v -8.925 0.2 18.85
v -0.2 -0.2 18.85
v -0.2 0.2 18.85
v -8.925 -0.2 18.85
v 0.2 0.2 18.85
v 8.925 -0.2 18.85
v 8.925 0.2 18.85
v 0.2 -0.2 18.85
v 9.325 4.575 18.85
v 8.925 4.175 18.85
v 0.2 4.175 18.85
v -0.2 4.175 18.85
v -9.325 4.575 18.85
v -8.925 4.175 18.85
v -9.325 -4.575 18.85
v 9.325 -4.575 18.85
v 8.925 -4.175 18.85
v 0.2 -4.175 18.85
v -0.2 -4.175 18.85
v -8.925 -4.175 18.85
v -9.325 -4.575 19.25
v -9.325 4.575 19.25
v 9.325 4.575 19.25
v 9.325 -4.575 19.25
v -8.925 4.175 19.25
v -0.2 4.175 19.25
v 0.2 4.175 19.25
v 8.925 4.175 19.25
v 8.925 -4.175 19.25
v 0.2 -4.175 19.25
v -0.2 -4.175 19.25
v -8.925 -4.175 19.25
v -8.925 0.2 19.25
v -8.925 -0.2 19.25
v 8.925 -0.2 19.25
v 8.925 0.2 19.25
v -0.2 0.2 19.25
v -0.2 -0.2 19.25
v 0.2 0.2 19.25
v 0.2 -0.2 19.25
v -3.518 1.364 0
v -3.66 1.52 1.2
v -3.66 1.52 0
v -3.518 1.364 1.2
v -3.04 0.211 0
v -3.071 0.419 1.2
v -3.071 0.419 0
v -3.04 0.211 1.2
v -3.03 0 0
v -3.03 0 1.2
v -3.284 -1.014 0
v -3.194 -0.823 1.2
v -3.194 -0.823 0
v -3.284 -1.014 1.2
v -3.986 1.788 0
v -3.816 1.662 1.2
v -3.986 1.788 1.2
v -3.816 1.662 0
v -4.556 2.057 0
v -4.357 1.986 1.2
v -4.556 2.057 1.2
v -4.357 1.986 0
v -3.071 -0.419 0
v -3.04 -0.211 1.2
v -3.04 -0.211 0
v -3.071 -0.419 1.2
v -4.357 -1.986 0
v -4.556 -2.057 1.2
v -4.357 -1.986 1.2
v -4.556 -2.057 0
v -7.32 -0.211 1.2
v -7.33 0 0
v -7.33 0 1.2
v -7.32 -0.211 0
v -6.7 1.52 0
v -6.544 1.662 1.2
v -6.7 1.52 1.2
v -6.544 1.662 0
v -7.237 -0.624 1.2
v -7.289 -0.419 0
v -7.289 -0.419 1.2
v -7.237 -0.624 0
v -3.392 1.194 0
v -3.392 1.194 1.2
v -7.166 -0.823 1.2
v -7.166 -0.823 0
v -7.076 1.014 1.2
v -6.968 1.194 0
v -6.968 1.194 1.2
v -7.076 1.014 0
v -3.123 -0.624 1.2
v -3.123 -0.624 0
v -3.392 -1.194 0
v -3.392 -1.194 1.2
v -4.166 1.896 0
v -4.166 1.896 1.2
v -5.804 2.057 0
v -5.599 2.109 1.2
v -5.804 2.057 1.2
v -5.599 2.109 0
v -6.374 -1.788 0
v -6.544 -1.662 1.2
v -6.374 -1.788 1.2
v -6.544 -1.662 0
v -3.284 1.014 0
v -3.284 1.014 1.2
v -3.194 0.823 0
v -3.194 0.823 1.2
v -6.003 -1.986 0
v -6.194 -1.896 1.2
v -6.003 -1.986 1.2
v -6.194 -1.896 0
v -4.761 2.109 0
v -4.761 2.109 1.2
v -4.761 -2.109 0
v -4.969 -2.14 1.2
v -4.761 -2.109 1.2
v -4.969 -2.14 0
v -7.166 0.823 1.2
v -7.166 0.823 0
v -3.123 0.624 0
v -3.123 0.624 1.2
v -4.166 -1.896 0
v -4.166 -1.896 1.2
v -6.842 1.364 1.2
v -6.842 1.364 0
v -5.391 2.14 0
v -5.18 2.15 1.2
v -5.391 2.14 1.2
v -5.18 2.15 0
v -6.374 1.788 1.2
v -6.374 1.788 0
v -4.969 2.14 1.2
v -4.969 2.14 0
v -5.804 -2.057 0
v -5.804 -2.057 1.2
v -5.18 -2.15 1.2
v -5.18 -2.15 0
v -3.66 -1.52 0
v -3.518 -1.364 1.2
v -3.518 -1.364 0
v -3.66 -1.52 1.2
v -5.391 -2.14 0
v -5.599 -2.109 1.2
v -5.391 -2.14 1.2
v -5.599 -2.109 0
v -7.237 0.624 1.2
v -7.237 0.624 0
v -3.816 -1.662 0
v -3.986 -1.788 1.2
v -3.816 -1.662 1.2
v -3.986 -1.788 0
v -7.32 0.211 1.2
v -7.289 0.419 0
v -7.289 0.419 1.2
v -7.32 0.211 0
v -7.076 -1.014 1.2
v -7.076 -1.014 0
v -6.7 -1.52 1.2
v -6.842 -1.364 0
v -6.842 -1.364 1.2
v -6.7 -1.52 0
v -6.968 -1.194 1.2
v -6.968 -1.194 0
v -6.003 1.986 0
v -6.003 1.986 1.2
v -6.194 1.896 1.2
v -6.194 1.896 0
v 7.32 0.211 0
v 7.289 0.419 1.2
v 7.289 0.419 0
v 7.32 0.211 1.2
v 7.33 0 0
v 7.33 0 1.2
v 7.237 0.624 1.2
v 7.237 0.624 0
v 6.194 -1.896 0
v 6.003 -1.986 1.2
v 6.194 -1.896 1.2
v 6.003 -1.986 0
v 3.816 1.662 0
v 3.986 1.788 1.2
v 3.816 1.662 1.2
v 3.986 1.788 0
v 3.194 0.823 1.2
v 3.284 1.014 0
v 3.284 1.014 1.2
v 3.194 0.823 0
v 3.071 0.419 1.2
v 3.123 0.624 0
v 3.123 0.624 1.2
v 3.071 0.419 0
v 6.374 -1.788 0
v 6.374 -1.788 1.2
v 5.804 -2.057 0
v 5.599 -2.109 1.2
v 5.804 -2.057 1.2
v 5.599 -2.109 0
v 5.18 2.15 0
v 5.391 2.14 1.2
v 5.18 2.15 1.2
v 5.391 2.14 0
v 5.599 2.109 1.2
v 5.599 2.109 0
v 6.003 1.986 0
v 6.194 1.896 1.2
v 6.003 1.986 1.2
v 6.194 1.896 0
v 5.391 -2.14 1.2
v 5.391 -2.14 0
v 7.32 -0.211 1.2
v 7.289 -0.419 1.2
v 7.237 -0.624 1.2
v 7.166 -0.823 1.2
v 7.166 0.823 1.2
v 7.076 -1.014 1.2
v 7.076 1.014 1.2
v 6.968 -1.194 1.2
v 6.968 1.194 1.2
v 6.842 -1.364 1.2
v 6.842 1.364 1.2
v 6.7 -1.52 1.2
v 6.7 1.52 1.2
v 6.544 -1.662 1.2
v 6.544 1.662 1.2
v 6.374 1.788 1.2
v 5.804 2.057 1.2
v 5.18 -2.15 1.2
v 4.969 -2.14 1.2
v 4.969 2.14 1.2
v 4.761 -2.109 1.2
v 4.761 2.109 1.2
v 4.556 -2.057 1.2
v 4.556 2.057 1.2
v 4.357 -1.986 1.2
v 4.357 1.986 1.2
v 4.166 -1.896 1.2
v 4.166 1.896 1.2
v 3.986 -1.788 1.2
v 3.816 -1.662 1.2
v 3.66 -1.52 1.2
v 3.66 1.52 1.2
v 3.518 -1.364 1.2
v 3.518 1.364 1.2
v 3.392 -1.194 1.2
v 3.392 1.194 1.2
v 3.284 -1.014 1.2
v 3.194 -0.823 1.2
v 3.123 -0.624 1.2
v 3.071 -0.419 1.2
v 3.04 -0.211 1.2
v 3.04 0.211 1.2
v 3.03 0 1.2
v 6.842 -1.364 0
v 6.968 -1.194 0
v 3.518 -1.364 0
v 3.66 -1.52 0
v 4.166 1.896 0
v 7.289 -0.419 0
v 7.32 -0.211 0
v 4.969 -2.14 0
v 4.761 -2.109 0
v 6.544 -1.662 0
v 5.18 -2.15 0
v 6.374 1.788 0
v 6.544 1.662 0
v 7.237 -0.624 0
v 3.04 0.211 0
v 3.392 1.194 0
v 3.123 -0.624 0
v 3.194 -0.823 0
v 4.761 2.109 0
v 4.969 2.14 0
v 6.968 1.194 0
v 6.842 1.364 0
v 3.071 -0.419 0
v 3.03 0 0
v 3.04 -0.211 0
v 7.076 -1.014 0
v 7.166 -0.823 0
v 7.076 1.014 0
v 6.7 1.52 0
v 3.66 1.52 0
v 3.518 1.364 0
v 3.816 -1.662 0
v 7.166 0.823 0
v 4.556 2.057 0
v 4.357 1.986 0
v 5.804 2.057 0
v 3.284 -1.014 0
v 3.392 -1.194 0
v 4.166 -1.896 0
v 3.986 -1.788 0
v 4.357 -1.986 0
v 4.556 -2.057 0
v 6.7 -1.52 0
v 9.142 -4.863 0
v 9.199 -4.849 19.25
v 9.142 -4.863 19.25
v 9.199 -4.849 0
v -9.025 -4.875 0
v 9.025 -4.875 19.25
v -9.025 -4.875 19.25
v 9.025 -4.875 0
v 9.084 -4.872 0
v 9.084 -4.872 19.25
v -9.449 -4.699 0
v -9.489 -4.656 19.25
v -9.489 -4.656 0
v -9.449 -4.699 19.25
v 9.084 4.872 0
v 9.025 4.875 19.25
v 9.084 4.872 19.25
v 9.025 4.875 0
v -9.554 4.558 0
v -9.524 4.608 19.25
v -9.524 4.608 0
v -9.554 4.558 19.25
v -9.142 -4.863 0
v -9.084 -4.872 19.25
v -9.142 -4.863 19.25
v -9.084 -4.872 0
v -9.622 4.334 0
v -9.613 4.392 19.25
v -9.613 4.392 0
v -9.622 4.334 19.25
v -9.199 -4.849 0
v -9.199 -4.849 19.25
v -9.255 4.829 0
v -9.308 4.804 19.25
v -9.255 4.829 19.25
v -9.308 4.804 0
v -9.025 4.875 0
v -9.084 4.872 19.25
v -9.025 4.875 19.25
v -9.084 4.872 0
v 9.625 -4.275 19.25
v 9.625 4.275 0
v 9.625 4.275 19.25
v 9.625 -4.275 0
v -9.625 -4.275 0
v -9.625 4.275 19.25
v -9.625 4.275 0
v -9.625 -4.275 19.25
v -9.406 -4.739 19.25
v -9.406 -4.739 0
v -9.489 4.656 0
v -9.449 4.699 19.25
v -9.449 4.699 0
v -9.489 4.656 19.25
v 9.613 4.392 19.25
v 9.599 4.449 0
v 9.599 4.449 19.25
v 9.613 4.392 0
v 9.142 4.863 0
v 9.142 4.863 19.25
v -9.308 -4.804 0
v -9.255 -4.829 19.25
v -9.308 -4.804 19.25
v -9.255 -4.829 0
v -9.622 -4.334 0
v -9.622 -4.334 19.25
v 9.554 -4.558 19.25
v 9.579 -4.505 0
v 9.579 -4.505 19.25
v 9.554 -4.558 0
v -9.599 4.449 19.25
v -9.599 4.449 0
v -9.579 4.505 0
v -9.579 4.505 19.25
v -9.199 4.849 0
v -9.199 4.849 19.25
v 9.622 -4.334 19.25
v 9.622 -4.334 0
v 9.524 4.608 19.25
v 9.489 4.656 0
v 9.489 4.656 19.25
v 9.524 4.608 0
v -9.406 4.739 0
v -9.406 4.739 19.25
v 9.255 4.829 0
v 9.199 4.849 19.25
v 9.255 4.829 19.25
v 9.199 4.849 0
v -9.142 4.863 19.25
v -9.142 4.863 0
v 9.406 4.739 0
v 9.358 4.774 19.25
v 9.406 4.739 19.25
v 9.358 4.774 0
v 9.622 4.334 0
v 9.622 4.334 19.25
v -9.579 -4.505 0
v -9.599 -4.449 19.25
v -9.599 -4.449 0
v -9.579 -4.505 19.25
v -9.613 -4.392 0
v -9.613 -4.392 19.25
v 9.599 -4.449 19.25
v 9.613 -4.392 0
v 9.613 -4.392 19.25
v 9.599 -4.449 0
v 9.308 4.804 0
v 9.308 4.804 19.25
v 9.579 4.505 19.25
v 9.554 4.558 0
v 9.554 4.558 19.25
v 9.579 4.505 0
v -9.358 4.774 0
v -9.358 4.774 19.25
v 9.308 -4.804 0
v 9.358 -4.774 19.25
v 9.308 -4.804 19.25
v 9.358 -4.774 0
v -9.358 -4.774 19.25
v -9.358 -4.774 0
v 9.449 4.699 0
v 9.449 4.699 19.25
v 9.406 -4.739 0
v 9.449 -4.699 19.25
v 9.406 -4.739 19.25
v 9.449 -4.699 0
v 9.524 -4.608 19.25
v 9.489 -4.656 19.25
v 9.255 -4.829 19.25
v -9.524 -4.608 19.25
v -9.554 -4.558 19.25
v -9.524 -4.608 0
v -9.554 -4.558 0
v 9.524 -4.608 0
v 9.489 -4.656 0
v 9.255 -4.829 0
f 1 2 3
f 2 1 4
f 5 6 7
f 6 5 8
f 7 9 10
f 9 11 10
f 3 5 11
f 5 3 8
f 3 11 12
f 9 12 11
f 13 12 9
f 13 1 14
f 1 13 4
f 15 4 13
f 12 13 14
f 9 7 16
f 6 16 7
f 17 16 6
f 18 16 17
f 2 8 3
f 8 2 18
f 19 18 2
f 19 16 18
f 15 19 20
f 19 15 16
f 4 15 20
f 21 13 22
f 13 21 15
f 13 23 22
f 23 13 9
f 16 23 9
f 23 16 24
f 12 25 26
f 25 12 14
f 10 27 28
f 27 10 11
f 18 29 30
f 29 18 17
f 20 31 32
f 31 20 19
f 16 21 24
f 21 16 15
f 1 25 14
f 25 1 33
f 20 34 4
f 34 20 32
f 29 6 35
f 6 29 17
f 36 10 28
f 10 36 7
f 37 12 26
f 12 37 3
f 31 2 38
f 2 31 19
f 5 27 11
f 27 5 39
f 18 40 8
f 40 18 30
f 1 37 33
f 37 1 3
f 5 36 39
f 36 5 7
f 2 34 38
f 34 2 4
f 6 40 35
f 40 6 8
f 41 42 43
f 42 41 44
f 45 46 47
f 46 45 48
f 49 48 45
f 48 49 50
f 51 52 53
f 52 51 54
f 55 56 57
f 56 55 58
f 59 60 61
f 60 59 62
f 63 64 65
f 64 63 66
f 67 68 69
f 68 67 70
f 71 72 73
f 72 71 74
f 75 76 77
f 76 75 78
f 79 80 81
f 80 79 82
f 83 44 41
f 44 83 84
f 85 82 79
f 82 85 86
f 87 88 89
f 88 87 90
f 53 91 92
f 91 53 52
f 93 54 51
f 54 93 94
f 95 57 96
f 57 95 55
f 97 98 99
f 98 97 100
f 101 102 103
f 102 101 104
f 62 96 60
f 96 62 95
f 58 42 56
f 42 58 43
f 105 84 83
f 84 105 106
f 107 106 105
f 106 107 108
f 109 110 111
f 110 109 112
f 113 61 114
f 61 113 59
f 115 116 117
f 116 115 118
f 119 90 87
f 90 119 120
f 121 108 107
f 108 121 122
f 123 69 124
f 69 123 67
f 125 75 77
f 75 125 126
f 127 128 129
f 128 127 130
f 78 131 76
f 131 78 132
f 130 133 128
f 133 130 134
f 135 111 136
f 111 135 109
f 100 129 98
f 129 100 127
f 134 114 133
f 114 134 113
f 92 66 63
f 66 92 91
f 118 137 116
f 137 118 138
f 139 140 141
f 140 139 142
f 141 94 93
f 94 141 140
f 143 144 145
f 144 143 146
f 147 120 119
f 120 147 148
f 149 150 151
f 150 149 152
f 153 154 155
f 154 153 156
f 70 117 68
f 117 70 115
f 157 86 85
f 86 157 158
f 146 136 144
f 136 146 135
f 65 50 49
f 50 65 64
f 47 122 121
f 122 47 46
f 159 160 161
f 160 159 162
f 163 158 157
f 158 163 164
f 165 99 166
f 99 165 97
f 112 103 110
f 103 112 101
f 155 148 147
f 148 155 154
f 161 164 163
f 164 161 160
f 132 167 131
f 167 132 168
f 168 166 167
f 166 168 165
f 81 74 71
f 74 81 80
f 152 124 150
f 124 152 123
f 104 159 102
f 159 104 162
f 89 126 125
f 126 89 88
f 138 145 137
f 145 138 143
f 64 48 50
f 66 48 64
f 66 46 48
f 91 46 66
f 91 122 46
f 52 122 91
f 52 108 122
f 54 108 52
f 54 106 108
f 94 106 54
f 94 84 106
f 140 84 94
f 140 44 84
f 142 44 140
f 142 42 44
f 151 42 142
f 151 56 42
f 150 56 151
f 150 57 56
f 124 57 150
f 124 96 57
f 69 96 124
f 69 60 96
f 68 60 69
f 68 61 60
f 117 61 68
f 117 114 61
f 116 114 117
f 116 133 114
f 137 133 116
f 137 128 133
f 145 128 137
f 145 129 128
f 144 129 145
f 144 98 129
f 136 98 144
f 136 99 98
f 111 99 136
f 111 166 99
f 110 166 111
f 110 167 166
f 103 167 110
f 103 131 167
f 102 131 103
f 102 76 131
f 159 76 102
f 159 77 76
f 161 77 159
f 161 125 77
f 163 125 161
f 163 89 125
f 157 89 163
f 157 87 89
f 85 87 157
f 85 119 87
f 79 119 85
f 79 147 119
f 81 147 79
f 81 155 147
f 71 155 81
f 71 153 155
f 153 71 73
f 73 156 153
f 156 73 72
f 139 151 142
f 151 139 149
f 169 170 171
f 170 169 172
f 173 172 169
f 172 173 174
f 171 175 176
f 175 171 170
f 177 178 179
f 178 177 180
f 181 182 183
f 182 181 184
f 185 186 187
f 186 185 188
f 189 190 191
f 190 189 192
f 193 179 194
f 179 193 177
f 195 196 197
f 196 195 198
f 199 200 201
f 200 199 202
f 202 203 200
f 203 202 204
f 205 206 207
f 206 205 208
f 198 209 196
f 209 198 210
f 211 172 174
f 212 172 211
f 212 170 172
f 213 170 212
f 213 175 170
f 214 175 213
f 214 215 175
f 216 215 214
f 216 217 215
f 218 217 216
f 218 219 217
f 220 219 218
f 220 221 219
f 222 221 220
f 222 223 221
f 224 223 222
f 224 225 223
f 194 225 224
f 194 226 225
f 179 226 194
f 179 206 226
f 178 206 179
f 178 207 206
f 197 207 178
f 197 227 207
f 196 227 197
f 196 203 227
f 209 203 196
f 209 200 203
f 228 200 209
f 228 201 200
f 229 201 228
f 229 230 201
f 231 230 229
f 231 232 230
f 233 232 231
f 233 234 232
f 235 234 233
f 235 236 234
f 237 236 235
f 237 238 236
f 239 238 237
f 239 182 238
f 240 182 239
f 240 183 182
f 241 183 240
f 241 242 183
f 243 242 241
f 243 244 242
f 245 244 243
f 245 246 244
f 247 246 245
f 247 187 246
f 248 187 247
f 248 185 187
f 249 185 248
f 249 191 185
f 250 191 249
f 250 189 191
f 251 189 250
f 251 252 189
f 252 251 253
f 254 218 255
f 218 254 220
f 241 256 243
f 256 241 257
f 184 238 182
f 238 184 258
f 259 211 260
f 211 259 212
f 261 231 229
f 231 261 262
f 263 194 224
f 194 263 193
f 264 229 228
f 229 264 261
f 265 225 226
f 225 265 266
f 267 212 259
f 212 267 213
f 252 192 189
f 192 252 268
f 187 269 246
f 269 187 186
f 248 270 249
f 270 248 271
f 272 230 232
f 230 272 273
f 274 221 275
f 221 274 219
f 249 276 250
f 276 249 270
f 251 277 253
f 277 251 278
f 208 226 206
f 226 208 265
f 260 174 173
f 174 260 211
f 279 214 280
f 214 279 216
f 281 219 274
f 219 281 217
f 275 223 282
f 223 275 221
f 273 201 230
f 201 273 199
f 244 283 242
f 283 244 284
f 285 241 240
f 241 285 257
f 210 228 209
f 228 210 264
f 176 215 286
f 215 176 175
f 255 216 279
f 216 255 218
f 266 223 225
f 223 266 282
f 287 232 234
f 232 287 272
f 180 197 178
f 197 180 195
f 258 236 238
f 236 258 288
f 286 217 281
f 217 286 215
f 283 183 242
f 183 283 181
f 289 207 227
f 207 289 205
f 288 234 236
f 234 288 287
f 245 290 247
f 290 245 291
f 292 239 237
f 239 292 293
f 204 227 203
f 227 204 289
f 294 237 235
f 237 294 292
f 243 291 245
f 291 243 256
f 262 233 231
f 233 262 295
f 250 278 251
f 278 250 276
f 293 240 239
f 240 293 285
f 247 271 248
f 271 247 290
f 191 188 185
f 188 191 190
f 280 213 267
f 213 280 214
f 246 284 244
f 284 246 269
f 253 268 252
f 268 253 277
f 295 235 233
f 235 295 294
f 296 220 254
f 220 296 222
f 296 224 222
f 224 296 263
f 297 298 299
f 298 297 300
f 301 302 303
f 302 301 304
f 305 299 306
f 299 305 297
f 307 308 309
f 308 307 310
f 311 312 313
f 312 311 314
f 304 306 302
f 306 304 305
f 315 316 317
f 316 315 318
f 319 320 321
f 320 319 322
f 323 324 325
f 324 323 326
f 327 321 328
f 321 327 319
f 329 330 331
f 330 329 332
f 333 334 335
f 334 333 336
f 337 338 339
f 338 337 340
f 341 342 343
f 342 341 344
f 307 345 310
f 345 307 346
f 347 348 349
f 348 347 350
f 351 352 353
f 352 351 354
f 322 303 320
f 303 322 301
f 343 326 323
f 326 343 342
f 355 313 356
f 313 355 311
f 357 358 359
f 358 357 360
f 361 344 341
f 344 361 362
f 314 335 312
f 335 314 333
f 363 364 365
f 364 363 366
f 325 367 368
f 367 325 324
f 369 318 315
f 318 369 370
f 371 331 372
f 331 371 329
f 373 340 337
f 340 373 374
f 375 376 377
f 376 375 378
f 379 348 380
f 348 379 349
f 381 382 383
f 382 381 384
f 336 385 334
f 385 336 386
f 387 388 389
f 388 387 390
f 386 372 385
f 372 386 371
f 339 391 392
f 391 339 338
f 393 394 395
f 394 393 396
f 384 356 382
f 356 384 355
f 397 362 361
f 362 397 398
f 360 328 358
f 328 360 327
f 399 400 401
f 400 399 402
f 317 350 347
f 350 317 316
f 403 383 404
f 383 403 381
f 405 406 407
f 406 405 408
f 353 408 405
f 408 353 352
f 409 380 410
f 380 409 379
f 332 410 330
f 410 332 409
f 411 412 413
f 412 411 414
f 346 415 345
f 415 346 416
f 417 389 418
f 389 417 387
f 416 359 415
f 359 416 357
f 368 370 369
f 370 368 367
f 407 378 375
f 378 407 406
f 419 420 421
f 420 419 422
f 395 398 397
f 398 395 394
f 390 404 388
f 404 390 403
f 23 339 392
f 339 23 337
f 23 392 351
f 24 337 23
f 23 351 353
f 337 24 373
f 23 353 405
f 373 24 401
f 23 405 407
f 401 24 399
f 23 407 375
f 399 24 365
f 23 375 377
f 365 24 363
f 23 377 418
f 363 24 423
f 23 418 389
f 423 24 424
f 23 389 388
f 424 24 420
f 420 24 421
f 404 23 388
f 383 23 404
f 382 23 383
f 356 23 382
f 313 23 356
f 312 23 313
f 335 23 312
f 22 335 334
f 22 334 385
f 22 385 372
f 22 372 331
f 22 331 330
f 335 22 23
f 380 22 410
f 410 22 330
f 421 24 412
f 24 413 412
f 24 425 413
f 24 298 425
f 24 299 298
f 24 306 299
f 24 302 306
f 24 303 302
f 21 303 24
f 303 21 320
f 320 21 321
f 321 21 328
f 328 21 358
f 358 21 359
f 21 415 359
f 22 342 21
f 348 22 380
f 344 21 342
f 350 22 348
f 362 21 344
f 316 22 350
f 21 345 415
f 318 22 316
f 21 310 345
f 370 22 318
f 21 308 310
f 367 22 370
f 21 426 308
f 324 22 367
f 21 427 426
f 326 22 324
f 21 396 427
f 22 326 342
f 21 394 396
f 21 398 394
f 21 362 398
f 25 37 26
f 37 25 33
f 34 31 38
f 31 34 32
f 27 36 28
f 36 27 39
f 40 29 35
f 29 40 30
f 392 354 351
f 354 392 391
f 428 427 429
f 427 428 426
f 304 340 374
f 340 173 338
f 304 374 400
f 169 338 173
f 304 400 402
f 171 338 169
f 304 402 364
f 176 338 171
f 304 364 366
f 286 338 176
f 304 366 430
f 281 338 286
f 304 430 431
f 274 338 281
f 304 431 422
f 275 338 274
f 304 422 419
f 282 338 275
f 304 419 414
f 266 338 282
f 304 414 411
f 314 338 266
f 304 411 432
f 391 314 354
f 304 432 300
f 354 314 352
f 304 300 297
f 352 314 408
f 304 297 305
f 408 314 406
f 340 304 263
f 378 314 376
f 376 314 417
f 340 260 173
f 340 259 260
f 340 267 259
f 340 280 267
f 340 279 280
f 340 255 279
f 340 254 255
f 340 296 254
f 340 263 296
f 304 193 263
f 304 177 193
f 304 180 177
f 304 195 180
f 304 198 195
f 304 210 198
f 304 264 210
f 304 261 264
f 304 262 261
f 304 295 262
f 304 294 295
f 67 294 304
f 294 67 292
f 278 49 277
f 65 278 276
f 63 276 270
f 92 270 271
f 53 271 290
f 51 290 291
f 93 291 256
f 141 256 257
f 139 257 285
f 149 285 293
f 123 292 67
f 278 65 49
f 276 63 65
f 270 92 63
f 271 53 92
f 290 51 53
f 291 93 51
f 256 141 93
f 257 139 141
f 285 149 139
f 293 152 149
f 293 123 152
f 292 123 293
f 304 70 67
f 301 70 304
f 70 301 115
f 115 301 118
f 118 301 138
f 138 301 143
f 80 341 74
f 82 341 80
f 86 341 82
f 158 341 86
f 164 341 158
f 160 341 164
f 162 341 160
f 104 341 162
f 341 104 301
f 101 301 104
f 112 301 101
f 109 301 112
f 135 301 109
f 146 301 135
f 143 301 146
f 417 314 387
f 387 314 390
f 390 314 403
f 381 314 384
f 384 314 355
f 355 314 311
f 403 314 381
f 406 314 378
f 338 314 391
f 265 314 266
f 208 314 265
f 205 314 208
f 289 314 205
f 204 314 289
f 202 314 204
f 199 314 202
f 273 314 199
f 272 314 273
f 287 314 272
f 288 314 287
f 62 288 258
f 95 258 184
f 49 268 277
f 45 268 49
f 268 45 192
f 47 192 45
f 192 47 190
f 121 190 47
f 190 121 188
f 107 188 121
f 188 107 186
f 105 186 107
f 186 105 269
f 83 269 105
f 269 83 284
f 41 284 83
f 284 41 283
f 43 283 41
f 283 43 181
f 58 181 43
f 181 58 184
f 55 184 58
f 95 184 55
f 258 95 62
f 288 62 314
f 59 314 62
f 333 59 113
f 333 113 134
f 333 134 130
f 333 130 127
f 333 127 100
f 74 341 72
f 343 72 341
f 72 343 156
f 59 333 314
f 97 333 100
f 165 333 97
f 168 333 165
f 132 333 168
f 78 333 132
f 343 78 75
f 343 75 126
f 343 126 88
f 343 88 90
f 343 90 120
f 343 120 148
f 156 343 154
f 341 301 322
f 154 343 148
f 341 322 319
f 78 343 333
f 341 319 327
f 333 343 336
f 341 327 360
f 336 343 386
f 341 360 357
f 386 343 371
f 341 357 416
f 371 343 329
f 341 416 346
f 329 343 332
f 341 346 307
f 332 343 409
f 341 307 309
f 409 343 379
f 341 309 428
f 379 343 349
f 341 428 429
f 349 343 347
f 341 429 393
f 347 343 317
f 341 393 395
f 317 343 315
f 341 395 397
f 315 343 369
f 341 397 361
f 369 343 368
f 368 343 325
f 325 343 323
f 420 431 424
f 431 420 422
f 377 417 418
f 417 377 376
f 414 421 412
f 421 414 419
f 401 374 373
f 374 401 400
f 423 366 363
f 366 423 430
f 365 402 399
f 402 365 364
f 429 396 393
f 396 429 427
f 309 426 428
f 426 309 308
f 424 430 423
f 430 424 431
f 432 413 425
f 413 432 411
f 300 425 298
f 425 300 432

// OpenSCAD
// kidsroom / cube_storage — an open cube-storage shelving grid token
// (KALLAX-style), with the Cols x Rows cube grid engraved on top and
// nothing else.
//
// Width/Depth are the real-world footprint in cm: a 2x2 unit is 77 wide and
// 39 deep — one cube deep, however many columns it runs side by side. Cols
// only drives the engraved grid and should be kept in step with Width by
// hand (see the comment on Width below); Rows only adds more engraved
// divider lines — Depth stays 39 either way, since the unit is always one
// cube deep. Height is the real carcass height, shrunk by the plan scale like the
// footprint (see printed_h() in lib/common.scad) — a cube is about 39 cm, so keep it
// in step with Rows: 77 for two rows standing up, 147 for four.

include <../lib/common.scad>

Cols   = 2;   // grid columns engraved on top — keep Width in step by hand
Rows   = 2;   // grid rows engraved on top — Depth stays fixed either way
Width  = 77;  // cm — Kallax runs 77 wide for Cols=2 or 147 for Cols=4
Depth  = 39;  // cm — one cube deep
Height = 77;  // cm — Rows cubes high: 77 for Rows=2, 147 for Rows=4

// the printed height, mm: Height at the plan scale
Print_h = printed_h(Height);

Show_grid   = true;
Grid_margin = 2;  // cm the grid sits in from the edge, like bench.scad's Lid_inset
// Magnet pockets in the bottom face (0 = none). Two keep the piece from
// pivoting on the board; see Magnet_* in lib/common.scad. The 39 cm depth is
// 9.75 mm across at 1:40 — comfortably wide enough for a 4 mm disc.
Magnets = 2;

cube_storage();

module cube_storage() {
    difference() {
        footprint(Width, Depth, Print_h);
        // the grid gets the whole top face: Cols x Rows open cube squares
        if (Show_grid) cube_grid(Print_h);
        if (Magnets > 0) magnets(Width, Depth, Magnets);
    }
}

// The Cols x Rows cube grid: an outer frame plus one interior divider per
// internal column/row boundary, all drawn as groove() edges (like
// bench.scad's lid seam) instead of a filled cut, so it reads as a waffle of
// open cube squares rather than a second footprint.
module cube_grid(top_z, margin = Grid_margin, cols = Cols, rows = Rows) {
    stroke = Symbol_stroke * Scale / 10;  // one nozzle, back-converted to real cm
    hw = Width / 2 - margin;
    hd = Depth / 2 - margin;
    union() {
        // outer frame
        groove(0,   hd, 2 * hw + stroke, stroke, top_z);
        groove(0,  -hd, 2 * hw + stroke, stroke, top_z);
        groove(-hw,  0, stroke, 2 * hd + stroke, top_z);
        groove( hw,  0, stroke, 2 * hd + stroke, top_z);
        // interior column dividers
        for (i = [1 : cols - 1])
            groove(-hw + i * 2 * hw / cols, 0, stroke, 2 * hd + stroke, top_z);
        // interior row dividers
        for (i = [1 : rows - 1])
            groove(0, -hd + i * 2 * hd / rows, 2 * hw + stroke, stroke, top_z);
    }
}
